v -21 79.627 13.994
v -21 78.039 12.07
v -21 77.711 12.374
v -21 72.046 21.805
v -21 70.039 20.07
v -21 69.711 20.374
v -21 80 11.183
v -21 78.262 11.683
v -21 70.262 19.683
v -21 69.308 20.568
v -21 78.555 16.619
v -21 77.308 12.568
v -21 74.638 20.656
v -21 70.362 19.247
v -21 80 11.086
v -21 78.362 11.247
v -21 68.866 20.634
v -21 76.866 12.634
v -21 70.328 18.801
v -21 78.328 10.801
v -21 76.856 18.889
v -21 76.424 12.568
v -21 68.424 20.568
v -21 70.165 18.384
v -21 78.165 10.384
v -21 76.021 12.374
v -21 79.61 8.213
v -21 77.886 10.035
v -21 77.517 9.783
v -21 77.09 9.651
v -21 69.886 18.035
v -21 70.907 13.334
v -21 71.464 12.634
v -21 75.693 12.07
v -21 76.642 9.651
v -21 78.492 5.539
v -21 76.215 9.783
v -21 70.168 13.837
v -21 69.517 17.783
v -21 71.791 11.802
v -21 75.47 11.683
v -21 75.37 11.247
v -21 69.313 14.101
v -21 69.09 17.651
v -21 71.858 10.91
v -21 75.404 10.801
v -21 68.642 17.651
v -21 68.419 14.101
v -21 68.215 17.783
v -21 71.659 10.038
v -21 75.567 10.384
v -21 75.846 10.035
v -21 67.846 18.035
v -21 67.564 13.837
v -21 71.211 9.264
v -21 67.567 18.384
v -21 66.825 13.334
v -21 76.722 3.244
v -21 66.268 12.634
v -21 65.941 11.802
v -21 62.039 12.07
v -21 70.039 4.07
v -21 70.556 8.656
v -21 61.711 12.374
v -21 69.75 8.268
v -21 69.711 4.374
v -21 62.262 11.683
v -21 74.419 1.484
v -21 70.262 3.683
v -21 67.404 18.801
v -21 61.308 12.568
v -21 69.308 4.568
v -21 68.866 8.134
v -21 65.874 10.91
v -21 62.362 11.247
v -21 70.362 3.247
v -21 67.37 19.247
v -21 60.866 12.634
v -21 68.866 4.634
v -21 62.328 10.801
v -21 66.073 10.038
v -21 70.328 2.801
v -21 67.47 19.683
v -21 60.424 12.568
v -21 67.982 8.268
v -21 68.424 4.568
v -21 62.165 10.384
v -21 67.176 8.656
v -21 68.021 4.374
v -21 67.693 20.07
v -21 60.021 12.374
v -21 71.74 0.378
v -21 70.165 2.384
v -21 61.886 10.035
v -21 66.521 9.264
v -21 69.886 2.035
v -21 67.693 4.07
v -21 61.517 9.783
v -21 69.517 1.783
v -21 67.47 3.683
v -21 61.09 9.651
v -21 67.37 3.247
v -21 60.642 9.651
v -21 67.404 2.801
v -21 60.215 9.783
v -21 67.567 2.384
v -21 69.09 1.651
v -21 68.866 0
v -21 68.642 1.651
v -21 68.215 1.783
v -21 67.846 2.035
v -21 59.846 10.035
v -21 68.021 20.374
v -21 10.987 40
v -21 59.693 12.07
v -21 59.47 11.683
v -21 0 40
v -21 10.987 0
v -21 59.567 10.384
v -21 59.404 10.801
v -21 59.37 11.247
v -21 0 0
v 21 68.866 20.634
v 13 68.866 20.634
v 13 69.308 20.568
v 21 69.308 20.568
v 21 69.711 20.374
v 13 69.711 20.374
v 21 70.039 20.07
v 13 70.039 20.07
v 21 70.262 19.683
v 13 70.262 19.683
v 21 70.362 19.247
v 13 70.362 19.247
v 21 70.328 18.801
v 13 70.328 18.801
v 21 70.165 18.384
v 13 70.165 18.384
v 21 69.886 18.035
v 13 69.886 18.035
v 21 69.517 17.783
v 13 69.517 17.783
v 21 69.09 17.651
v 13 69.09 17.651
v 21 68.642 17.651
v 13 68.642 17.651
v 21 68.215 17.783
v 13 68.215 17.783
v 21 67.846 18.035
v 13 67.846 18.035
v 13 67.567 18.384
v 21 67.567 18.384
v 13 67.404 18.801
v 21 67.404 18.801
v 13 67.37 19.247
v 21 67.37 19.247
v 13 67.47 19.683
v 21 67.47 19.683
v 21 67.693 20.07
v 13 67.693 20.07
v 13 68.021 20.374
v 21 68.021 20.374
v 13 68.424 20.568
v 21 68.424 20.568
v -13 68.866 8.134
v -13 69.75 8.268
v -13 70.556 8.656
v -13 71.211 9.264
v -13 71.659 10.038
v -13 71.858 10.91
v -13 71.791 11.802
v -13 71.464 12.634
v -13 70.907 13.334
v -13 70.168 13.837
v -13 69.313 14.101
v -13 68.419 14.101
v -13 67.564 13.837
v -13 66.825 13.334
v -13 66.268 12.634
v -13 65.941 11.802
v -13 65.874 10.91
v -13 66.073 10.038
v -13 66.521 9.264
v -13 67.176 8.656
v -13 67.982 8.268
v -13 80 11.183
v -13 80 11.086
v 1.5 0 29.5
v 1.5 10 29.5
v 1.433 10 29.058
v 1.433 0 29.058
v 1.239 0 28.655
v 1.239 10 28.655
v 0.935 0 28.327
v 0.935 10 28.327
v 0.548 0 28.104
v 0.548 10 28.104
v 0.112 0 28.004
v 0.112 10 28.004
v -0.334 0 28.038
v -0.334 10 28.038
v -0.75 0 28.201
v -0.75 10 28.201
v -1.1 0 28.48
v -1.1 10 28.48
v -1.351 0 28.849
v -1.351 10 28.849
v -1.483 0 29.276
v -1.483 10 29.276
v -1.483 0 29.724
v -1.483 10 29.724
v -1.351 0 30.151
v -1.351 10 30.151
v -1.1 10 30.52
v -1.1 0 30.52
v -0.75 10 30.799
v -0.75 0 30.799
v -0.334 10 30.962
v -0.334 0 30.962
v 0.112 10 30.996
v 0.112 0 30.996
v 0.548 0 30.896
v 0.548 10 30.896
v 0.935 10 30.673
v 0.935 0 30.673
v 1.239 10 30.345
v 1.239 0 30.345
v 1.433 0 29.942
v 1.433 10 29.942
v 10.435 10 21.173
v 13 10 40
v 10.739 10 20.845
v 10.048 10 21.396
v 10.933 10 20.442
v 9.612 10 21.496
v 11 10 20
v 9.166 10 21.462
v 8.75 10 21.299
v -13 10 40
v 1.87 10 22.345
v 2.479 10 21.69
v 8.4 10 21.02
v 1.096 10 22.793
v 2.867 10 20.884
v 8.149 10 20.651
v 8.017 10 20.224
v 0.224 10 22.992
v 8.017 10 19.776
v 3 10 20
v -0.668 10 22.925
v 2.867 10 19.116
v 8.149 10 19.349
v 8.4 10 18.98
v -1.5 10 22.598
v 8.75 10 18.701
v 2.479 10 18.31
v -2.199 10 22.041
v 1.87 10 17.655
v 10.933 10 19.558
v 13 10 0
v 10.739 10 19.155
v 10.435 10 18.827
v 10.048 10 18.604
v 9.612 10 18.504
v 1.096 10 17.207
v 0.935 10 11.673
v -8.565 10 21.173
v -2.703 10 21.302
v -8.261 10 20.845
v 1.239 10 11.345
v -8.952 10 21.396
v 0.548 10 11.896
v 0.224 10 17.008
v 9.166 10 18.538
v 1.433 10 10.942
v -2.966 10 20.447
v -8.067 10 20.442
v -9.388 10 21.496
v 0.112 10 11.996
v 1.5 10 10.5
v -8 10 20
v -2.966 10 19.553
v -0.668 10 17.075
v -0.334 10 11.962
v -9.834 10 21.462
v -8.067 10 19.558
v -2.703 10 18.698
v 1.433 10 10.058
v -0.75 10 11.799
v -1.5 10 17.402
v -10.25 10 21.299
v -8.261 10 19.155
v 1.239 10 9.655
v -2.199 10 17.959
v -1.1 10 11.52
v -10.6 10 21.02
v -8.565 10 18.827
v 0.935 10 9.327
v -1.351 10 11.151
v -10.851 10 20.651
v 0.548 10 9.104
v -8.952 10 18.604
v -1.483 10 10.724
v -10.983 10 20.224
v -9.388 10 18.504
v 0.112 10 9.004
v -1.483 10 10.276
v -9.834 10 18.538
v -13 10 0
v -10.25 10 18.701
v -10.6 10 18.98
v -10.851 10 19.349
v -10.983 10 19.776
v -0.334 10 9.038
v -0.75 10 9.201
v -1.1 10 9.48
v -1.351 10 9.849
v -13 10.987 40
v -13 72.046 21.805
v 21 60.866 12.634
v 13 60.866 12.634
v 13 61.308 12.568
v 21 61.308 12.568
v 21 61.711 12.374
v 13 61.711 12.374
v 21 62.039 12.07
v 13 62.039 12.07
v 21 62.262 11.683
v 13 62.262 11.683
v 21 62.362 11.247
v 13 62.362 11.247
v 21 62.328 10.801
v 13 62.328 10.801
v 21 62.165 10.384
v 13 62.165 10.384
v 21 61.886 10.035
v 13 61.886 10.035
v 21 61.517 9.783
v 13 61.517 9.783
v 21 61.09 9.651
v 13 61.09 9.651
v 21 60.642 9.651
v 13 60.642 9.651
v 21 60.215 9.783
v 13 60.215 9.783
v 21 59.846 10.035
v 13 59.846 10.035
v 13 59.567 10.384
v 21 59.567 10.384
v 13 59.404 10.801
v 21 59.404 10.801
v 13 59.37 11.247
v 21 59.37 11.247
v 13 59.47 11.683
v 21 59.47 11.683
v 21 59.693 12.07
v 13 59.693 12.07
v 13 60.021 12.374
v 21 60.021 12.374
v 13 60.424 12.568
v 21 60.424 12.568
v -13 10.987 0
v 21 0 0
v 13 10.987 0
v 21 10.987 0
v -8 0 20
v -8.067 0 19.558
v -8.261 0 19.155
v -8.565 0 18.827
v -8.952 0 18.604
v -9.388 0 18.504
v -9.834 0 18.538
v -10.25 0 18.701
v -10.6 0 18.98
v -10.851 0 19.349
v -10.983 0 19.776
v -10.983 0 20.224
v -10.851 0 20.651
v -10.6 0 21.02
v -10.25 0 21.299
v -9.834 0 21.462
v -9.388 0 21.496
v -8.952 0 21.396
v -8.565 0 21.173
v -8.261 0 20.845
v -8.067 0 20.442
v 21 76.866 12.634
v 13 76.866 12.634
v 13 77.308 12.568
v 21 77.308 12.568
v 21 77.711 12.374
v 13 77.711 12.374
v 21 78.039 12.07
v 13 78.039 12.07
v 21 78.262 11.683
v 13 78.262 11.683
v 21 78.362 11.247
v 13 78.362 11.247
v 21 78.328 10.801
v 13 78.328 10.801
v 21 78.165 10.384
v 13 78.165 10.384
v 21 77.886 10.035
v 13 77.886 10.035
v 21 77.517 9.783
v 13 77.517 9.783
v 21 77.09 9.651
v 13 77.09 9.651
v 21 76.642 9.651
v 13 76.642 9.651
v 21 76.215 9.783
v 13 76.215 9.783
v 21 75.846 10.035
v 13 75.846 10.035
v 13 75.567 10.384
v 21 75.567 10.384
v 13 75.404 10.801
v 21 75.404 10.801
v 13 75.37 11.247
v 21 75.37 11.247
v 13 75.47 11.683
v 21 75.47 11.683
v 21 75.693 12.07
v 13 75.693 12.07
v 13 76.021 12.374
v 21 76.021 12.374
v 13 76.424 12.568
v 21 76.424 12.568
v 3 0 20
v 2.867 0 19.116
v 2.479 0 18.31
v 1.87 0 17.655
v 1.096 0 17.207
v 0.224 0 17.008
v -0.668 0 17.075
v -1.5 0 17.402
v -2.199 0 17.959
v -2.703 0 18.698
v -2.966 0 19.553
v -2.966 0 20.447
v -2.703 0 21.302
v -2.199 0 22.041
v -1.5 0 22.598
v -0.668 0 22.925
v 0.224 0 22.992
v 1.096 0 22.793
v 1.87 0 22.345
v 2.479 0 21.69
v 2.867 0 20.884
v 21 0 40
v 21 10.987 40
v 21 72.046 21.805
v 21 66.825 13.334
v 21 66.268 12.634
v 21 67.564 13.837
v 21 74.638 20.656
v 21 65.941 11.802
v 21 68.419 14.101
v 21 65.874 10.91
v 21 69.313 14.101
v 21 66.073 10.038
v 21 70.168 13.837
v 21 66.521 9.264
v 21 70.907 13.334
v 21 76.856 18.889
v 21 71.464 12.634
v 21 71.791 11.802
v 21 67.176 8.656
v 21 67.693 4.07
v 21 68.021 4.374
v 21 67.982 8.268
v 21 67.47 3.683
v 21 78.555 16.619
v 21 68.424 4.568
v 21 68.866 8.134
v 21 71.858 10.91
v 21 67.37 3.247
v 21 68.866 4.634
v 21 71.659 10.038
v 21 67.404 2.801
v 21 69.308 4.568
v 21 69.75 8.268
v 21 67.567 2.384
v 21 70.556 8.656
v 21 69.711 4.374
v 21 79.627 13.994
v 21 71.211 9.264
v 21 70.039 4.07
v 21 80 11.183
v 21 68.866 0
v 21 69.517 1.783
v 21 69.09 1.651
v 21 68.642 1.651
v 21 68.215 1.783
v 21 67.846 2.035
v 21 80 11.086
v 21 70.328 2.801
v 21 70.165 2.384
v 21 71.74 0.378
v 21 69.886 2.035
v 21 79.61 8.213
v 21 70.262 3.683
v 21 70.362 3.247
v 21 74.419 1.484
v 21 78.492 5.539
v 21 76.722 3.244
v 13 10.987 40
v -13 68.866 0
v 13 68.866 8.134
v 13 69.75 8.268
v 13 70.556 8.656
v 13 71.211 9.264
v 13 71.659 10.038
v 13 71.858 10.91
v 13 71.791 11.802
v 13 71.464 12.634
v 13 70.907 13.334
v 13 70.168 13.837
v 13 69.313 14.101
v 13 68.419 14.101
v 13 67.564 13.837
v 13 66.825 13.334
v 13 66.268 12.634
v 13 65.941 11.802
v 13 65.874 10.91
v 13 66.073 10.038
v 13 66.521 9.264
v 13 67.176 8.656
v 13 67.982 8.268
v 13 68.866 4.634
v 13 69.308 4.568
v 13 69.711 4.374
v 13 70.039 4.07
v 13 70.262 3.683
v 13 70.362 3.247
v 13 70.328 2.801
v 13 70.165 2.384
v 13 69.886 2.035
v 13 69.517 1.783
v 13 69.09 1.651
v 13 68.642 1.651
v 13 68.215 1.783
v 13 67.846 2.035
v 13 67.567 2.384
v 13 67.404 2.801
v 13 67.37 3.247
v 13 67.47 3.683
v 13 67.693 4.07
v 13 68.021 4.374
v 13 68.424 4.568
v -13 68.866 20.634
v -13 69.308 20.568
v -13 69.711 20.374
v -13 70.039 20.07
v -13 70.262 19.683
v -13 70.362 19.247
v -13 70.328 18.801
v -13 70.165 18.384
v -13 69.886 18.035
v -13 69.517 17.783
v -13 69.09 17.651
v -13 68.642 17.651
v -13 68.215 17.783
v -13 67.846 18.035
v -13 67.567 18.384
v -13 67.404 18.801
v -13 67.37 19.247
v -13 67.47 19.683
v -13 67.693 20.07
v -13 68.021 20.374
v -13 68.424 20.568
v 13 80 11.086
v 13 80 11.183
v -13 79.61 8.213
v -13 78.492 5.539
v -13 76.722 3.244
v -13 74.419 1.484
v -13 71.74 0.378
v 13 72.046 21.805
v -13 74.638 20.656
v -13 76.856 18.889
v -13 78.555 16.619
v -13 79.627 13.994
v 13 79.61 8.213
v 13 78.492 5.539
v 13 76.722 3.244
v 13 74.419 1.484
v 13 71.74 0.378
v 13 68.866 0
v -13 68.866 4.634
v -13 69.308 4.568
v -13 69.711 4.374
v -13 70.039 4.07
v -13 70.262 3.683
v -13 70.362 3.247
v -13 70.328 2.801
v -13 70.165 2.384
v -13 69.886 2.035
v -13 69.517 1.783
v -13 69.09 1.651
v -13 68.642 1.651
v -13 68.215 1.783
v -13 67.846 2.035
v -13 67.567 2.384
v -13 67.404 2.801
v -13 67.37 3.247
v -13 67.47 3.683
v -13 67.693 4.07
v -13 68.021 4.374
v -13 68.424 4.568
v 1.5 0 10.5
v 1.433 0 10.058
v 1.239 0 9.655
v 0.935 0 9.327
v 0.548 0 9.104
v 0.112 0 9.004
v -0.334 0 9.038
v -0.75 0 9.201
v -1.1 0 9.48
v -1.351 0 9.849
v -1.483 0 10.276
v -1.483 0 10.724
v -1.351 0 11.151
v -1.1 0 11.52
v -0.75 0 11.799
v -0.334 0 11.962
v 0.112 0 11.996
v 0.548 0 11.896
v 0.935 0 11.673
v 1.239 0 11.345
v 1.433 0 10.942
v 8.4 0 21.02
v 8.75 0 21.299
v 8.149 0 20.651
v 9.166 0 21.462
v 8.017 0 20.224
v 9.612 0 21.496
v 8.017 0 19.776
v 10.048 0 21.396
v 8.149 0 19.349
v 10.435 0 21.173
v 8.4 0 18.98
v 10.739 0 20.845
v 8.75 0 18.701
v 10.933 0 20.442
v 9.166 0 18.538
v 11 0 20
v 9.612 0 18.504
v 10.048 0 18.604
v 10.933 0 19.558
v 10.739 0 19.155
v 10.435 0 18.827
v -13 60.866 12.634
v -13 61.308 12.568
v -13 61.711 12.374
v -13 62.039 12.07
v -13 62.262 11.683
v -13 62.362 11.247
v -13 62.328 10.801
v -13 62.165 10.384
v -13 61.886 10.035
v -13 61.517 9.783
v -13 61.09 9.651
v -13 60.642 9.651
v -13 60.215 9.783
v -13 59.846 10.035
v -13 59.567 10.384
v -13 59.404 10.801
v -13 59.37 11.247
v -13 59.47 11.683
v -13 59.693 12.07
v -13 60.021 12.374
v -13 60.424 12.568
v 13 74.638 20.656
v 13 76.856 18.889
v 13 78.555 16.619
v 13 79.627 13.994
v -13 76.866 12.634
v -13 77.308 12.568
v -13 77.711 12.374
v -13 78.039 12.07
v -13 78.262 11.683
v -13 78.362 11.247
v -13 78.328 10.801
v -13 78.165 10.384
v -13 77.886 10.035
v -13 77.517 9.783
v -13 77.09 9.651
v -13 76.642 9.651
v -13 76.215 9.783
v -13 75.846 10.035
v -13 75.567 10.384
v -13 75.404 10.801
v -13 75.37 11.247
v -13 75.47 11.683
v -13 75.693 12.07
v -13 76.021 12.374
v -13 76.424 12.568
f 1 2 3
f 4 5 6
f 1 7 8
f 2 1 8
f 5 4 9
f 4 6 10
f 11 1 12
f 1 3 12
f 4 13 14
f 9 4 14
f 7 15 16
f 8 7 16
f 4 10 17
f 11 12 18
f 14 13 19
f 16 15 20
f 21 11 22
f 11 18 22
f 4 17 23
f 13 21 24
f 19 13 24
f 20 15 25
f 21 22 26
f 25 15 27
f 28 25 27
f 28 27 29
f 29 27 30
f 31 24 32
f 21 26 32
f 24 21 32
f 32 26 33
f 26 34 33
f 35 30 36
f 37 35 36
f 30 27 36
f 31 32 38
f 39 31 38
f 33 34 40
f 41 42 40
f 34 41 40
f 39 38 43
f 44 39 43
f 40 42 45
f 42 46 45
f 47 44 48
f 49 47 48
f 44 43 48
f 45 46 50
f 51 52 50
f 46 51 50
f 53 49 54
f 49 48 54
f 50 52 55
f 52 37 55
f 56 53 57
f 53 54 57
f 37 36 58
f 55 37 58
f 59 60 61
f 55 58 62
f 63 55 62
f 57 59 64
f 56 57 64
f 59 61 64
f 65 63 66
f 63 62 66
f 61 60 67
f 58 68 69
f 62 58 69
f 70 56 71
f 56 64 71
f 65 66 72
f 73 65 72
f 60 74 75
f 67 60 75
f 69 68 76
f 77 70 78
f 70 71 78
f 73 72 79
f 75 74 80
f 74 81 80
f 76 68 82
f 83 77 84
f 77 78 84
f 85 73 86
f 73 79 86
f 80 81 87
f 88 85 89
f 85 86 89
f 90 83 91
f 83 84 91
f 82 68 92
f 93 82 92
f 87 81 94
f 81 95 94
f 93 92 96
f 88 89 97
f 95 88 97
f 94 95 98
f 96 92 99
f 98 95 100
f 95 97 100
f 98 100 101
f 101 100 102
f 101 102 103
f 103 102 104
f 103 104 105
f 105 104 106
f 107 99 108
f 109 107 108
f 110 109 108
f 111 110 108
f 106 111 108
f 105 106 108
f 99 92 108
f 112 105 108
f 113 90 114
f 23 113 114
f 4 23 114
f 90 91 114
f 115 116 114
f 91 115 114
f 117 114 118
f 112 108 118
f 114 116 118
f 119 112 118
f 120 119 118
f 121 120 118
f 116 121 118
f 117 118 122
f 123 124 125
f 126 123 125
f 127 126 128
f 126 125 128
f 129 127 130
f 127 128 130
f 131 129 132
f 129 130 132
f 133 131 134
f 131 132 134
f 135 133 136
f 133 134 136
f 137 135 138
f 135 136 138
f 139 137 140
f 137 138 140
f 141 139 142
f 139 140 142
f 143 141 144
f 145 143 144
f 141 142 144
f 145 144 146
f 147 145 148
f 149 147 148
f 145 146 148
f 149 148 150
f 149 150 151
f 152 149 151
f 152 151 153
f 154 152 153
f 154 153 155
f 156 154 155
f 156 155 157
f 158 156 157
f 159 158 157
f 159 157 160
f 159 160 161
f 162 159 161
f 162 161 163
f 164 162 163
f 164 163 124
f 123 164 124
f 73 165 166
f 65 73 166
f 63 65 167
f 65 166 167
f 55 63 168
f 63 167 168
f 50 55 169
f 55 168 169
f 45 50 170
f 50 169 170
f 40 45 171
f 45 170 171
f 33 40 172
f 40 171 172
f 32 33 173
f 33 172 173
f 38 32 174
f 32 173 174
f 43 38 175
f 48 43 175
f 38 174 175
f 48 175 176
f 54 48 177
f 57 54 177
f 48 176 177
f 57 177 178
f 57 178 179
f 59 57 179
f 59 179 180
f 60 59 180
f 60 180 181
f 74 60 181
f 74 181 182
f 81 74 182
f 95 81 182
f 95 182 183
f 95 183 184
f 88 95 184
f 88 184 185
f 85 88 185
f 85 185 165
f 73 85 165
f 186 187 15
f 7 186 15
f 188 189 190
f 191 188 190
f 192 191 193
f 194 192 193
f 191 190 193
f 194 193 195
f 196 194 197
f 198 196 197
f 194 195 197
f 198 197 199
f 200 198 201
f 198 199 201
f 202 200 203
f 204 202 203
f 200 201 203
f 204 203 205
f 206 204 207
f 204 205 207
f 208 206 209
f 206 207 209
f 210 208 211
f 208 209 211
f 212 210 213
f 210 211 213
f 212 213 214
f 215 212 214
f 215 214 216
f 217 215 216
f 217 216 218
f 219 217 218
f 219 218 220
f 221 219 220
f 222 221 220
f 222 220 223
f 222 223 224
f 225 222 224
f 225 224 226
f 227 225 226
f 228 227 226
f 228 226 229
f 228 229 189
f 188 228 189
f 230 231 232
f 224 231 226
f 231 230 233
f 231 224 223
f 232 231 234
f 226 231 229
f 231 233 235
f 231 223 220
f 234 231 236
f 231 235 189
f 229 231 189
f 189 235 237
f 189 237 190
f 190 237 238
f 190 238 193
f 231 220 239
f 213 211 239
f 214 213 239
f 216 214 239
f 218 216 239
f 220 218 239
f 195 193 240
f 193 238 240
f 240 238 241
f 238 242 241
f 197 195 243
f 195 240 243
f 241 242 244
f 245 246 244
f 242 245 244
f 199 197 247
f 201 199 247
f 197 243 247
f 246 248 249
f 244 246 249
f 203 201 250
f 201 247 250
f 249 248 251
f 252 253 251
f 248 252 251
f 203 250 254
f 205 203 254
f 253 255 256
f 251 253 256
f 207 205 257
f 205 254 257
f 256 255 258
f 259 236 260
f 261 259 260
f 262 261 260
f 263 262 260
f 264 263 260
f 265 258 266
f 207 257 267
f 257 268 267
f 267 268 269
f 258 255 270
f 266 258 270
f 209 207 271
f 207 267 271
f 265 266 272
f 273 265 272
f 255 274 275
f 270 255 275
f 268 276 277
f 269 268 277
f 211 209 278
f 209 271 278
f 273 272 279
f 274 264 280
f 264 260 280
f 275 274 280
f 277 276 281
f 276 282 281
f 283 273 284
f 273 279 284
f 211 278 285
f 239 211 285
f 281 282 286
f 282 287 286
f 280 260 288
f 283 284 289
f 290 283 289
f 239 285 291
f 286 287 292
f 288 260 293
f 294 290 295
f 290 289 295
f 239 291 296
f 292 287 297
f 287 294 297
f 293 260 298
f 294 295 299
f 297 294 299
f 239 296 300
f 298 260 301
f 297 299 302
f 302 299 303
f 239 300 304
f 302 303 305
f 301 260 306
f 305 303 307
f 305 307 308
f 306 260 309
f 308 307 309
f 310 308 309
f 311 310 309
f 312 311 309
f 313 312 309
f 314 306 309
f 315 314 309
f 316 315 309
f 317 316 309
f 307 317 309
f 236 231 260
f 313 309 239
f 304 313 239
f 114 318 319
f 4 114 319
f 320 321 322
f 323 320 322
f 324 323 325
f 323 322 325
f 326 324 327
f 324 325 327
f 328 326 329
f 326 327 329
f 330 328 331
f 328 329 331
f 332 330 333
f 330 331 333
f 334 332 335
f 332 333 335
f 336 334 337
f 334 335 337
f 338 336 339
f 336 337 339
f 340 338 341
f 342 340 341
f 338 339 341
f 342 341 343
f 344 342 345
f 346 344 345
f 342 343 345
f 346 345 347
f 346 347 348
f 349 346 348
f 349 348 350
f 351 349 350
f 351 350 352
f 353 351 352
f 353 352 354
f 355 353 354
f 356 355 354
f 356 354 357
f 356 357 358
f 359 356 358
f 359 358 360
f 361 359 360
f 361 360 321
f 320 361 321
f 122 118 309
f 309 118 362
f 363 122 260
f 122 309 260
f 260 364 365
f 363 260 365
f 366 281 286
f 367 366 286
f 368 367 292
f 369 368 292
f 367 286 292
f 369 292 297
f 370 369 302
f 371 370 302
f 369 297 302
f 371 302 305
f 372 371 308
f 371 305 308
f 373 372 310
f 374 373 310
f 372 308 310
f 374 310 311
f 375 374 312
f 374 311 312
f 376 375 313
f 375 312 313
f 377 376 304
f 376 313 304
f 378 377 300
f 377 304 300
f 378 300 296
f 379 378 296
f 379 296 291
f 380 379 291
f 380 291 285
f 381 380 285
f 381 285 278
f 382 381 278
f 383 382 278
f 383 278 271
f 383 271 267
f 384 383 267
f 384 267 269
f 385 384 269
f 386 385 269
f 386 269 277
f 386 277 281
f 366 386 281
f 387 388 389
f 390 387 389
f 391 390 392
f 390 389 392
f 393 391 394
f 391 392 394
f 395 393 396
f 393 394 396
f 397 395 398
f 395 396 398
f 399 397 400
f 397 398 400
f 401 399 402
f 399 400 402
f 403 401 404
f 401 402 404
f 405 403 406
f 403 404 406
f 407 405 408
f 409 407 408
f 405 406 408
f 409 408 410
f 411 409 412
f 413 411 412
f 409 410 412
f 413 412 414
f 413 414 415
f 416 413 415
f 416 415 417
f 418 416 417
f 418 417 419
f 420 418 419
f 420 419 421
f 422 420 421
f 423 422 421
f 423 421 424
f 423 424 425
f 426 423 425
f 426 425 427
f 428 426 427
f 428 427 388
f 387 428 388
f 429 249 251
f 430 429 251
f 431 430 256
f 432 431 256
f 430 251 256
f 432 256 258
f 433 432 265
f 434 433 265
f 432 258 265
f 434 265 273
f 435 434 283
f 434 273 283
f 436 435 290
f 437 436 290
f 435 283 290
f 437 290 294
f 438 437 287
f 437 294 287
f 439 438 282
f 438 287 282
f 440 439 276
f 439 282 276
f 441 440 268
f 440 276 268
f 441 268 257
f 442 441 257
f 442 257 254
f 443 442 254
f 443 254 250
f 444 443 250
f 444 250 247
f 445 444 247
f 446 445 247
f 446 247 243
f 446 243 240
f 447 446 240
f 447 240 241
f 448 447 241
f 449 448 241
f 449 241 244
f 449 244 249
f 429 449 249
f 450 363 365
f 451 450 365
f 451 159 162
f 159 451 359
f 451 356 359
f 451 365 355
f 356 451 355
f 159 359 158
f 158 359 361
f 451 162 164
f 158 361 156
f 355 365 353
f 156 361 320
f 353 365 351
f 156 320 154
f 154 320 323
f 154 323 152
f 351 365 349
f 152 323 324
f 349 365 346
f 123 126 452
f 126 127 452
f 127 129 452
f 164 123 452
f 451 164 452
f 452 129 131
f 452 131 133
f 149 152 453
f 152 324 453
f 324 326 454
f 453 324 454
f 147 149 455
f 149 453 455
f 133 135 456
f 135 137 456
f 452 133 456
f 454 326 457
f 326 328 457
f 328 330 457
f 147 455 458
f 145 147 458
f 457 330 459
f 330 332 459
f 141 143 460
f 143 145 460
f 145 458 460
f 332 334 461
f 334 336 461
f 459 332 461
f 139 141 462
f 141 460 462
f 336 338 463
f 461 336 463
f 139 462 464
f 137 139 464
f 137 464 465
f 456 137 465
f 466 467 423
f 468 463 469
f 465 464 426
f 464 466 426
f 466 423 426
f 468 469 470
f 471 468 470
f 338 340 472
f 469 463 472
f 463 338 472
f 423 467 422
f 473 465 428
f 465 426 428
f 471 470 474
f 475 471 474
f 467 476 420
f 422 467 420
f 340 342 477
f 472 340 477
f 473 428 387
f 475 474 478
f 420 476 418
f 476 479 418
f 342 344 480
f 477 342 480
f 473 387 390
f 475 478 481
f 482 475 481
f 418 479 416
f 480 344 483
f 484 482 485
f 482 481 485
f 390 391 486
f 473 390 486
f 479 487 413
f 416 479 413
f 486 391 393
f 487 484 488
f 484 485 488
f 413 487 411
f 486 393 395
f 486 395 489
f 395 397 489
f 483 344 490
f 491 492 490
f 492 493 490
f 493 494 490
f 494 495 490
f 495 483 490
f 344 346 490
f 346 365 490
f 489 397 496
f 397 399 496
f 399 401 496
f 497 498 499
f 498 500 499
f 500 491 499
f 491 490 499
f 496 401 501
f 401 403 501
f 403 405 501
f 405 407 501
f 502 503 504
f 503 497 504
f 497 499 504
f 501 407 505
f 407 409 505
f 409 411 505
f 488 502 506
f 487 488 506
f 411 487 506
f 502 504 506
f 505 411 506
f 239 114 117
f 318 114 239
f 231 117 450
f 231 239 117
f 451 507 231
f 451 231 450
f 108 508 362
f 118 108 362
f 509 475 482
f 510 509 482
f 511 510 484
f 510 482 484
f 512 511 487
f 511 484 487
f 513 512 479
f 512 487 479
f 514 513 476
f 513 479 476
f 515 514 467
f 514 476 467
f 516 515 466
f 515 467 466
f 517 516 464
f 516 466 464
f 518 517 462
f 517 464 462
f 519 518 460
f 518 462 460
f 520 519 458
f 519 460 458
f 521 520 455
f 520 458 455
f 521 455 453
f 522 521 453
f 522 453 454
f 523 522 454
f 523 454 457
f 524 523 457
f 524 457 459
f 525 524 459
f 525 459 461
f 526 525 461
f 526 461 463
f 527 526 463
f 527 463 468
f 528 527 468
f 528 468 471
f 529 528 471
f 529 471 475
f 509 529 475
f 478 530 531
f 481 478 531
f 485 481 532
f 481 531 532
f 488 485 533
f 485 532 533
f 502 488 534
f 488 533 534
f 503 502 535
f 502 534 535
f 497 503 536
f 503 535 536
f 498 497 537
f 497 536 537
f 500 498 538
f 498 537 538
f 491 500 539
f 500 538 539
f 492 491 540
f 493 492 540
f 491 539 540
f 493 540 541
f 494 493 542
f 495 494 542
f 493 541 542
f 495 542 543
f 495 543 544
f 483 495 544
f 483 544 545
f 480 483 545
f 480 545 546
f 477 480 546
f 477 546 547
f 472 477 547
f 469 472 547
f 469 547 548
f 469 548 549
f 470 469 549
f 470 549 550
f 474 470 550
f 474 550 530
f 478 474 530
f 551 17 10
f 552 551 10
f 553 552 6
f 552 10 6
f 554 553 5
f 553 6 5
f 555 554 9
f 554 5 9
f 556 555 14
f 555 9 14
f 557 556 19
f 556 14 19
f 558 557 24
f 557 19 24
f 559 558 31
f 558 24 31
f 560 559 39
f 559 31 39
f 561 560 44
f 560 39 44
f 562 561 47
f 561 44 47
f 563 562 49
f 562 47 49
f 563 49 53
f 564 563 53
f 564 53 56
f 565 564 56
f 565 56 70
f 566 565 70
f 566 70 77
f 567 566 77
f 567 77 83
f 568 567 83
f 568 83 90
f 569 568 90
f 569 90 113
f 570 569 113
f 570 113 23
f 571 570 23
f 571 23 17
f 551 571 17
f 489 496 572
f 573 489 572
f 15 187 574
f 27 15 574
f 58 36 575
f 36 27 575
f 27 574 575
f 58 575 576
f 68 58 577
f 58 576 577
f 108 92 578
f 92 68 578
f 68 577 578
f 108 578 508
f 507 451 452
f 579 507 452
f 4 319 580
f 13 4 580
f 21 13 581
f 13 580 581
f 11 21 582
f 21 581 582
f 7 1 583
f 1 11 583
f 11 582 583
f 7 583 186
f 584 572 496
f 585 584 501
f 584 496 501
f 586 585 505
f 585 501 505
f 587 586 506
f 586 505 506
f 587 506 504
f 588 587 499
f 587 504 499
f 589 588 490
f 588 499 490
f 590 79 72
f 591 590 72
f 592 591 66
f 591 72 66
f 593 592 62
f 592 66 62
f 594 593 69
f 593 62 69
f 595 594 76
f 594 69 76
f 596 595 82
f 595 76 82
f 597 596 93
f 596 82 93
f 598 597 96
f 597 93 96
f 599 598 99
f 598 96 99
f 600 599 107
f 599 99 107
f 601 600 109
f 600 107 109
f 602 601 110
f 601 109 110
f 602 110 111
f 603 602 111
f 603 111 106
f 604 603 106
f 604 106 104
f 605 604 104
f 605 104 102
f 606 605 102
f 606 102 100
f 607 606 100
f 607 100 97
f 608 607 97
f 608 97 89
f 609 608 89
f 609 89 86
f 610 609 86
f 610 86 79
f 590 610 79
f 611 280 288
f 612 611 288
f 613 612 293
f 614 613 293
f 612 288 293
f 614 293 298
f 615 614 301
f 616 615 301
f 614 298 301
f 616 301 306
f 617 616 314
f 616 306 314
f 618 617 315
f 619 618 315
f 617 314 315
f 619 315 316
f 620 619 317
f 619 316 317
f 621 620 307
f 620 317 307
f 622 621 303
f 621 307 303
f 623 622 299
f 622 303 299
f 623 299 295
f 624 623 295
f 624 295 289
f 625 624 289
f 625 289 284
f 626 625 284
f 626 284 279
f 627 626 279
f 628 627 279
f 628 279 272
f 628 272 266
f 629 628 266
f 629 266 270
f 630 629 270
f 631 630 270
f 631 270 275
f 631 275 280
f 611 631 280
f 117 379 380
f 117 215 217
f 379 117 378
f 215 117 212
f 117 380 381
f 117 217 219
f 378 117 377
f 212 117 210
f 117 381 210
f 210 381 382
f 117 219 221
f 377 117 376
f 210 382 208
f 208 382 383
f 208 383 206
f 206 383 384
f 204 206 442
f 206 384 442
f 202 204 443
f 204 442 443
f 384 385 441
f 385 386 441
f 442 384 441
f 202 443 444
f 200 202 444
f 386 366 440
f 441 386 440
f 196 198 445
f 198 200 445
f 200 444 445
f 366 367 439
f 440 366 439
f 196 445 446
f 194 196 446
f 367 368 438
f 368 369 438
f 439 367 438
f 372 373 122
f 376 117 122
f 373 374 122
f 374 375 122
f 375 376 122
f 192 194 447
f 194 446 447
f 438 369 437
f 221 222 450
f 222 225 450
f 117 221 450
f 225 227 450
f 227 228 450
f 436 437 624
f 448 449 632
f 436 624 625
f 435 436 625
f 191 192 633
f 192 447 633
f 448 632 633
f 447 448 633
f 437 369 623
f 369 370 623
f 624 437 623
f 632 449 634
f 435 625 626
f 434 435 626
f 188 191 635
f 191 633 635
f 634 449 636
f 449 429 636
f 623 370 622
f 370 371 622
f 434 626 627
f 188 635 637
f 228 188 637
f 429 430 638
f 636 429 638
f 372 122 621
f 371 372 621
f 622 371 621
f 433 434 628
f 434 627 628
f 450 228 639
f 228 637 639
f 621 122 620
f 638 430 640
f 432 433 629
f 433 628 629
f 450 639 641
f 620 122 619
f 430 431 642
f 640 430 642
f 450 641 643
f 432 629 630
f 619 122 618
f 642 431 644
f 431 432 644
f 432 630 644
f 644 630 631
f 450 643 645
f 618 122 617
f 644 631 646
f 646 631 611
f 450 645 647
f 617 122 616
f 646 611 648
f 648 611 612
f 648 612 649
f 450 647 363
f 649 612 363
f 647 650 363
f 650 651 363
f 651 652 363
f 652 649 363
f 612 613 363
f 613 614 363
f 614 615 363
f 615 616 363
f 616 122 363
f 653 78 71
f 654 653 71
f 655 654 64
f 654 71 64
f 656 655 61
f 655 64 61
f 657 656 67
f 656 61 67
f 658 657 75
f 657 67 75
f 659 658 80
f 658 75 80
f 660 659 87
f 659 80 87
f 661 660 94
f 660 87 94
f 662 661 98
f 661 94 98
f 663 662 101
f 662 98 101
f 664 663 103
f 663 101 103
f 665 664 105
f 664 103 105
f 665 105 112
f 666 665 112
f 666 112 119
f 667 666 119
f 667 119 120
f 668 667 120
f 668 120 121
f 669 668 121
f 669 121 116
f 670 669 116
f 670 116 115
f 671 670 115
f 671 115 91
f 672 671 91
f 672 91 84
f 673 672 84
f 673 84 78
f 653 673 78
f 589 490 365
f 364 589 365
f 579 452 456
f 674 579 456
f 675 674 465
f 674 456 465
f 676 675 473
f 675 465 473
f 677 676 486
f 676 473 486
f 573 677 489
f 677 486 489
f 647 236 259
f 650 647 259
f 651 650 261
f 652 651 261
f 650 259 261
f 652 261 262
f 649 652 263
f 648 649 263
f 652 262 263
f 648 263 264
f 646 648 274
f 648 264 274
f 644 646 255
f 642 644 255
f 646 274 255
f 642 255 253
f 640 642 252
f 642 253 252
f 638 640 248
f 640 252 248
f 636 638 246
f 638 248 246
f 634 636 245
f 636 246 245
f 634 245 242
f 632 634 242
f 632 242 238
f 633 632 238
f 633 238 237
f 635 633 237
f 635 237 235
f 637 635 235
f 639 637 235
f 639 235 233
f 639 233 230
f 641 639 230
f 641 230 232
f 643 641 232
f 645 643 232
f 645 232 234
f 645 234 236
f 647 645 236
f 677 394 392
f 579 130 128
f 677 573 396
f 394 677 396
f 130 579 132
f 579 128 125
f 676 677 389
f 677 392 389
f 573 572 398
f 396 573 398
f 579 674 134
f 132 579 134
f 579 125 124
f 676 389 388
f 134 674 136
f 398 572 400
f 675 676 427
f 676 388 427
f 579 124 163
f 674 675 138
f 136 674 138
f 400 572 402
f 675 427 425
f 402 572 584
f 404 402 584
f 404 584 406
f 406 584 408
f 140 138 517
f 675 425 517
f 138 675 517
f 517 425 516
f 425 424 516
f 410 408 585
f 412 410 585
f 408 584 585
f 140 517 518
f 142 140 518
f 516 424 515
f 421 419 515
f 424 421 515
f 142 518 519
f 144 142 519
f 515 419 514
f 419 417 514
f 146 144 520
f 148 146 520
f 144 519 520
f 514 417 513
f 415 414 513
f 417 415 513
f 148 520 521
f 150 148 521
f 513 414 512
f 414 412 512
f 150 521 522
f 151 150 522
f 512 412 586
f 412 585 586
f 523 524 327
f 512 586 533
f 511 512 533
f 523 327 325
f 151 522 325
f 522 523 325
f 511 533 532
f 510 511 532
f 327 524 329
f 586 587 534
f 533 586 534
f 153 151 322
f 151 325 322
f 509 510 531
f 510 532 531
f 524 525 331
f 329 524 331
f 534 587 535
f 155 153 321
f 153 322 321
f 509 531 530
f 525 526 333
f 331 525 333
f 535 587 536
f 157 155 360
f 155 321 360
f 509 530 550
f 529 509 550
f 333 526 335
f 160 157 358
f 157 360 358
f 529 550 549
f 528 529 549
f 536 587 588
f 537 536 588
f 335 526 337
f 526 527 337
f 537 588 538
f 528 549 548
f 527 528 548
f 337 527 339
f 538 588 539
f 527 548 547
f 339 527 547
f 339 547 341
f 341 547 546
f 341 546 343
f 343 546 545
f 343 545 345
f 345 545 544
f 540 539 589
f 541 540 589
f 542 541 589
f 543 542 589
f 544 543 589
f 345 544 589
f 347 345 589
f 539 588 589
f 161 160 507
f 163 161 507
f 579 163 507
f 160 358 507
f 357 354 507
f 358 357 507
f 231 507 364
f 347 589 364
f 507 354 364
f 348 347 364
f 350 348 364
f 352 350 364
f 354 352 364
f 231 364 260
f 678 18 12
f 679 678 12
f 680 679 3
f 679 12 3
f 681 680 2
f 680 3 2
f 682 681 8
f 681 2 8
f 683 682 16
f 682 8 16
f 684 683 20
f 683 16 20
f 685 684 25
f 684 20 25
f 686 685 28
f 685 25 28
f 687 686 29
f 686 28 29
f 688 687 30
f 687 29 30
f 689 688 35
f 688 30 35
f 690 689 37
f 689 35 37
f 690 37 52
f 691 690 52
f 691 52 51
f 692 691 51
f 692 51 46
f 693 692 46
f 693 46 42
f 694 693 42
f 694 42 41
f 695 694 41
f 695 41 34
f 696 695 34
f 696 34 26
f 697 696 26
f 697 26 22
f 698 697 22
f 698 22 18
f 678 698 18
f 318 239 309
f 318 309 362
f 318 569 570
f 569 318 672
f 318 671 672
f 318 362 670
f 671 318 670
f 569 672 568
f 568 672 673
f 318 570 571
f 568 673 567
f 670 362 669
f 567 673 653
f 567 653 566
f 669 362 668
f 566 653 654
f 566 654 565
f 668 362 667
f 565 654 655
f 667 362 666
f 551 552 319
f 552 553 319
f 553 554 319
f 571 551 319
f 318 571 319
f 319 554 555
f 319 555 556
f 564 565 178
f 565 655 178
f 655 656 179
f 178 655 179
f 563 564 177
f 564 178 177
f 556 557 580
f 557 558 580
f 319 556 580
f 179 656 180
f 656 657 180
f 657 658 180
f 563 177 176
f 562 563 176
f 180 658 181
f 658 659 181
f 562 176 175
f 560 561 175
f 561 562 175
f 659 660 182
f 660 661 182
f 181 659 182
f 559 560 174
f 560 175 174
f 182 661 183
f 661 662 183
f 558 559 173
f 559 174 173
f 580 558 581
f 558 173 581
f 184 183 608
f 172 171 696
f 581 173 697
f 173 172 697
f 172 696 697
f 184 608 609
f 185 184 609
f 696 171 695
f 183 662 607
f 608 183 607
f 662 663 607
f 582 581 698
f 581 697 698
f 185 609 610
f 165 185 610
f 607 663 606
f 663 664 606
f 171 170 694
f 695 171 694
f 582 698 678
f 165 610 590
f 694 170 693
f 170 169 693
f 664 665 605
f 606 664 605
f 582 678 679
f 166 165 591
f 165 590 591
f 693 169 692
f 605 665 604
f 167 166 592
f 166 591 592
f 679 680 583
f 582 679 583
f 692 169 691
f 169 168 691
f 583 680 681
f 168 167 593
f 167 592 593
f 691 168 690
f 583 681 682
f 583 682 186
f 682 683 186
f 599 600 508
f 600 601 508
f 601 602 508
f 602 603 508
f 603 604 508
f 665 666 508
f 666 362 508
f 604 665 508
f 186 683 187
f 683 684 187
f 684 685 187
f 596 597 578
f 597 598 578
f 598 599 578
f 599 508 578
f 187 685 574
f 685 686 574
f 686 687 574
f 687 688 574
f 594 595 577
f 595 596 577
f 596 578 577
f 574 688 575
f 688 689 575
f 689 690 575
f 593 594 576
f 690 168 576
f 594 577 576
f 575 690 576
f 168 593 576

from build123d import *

# Parameters (mm, degrees)
DODANIE_WYCI_GNI_CIE1_DEPTH = 40
SZKIC2_R                    = 3
WYTNIJ_WYCI_GNI_CIE1_DEPTH  = 43
SZKIC3_R                    = 3
SZKIC3_R_2                  = 1.5
WYTNIJ_WYCI_GNI_CIE2_DEPTH  = 11
SZKIC4_R                    = 1.5
WYTNIJ_WYCI_GNI_CIE3_DEPTH  = 43


with BuildPart() as part:
    # Szkic1 → Dodanie-wyciągnięcie1 (new body)
    with BuildSketch(Plane.XY):
        Polygon((13, 10), (-13, 10), (-13, 80), (-21, 80), (-21, 0), (21, 0), (21, 80), (13, 80), align=None)
    extrude(amount=DODANIE_WYCI_GNI_CIE1_DEPTH)

    # Szkic2 → Wytnij-wyciągnięcie1 (cut, through all)
    with BuildSketch(Plane(origin=(21, 0, 0), x_dir=(0, 0, -1), z_dir=(1, 0, 0))):
        with BuildLine():
            Line((-40, 80), (-40, 10.986882517))
            Line((-40, 10.986882517), (-21.804909779, 72.045708909))
            ThreePointArc((-21.804909779, 72.045708909), (-17.808572792, 77.778071195), (-11.183339281, 80))
            Line((-11.183339281, 80), (-40, 80))
        make_face()
        with BuildLine():
            Line((-0.000389565, 68.866002091), (0, 10.986882517))
            Line((0, 10.986882517), (0, 80))
            Line((0, 80), (-11.085649948, 80))
            ThreePointArc((-11.085649948, 80), (-3.244243133, 76.721715095), (-0.000389565, 68.866002091))
        make_face()
        with Locations((-11.134494614, 68.866002091)):
            Circle(SZKIC2_R)
    extrude(amount=-WYTNIJ_WYCI_GNI_CIE1_DEPTH, mode=Mode.SUBTRACT)

    # Szkic3 → Wytnij-wyciągnięcie2 (cut, through all)
    with BuildSketch(Plane(origin=(0, 10, 0), x_dir=(1, 0, 0), z_dir=(0, 1, 0))):
        with Locations((0, -20)):
            Circle(SZKIC3_R)
        with Locations((0, -10.5)):
            Circle(SZKIC3_R_2)
        with Locations((9.5, -20)):
            Circle(SZKIC3_R_2)
        with Locations((0, -29.5)):
            Circle(SZKIC3_R_2)
        with Locations((-9.5, -20)):
            Circle(SZKIC3_R_2)
    extrude(amount=-WYTNIJ_WYCI_GNI_CIE2_DEPTH, mode=Mode.SUBTRACT)

    # Szkic4 → Wytnij-wyciągnięcie3 (cut, through all)
    with BuildSketch(Plane.ZY.offset(21)):
        with Locations((3.134494614, 68.866002091)):
            Circle(SZKIC4_R)
        with Locations((11.134494614, 76.866002091)):
            Circle(SZKIC4_R)
        with Locations((19.134494614, 68.866002091)):
            Circle(SZKIC4_R)
        with Locations((11.134494614, 60.866002091)):
            Circle(SZKIC4_R)
    extrude(amount=-WYTNIJ_WYCI_GNI_CIE3_DEPTH, mode=Mode.SUBTRACT)


solid = part.part
